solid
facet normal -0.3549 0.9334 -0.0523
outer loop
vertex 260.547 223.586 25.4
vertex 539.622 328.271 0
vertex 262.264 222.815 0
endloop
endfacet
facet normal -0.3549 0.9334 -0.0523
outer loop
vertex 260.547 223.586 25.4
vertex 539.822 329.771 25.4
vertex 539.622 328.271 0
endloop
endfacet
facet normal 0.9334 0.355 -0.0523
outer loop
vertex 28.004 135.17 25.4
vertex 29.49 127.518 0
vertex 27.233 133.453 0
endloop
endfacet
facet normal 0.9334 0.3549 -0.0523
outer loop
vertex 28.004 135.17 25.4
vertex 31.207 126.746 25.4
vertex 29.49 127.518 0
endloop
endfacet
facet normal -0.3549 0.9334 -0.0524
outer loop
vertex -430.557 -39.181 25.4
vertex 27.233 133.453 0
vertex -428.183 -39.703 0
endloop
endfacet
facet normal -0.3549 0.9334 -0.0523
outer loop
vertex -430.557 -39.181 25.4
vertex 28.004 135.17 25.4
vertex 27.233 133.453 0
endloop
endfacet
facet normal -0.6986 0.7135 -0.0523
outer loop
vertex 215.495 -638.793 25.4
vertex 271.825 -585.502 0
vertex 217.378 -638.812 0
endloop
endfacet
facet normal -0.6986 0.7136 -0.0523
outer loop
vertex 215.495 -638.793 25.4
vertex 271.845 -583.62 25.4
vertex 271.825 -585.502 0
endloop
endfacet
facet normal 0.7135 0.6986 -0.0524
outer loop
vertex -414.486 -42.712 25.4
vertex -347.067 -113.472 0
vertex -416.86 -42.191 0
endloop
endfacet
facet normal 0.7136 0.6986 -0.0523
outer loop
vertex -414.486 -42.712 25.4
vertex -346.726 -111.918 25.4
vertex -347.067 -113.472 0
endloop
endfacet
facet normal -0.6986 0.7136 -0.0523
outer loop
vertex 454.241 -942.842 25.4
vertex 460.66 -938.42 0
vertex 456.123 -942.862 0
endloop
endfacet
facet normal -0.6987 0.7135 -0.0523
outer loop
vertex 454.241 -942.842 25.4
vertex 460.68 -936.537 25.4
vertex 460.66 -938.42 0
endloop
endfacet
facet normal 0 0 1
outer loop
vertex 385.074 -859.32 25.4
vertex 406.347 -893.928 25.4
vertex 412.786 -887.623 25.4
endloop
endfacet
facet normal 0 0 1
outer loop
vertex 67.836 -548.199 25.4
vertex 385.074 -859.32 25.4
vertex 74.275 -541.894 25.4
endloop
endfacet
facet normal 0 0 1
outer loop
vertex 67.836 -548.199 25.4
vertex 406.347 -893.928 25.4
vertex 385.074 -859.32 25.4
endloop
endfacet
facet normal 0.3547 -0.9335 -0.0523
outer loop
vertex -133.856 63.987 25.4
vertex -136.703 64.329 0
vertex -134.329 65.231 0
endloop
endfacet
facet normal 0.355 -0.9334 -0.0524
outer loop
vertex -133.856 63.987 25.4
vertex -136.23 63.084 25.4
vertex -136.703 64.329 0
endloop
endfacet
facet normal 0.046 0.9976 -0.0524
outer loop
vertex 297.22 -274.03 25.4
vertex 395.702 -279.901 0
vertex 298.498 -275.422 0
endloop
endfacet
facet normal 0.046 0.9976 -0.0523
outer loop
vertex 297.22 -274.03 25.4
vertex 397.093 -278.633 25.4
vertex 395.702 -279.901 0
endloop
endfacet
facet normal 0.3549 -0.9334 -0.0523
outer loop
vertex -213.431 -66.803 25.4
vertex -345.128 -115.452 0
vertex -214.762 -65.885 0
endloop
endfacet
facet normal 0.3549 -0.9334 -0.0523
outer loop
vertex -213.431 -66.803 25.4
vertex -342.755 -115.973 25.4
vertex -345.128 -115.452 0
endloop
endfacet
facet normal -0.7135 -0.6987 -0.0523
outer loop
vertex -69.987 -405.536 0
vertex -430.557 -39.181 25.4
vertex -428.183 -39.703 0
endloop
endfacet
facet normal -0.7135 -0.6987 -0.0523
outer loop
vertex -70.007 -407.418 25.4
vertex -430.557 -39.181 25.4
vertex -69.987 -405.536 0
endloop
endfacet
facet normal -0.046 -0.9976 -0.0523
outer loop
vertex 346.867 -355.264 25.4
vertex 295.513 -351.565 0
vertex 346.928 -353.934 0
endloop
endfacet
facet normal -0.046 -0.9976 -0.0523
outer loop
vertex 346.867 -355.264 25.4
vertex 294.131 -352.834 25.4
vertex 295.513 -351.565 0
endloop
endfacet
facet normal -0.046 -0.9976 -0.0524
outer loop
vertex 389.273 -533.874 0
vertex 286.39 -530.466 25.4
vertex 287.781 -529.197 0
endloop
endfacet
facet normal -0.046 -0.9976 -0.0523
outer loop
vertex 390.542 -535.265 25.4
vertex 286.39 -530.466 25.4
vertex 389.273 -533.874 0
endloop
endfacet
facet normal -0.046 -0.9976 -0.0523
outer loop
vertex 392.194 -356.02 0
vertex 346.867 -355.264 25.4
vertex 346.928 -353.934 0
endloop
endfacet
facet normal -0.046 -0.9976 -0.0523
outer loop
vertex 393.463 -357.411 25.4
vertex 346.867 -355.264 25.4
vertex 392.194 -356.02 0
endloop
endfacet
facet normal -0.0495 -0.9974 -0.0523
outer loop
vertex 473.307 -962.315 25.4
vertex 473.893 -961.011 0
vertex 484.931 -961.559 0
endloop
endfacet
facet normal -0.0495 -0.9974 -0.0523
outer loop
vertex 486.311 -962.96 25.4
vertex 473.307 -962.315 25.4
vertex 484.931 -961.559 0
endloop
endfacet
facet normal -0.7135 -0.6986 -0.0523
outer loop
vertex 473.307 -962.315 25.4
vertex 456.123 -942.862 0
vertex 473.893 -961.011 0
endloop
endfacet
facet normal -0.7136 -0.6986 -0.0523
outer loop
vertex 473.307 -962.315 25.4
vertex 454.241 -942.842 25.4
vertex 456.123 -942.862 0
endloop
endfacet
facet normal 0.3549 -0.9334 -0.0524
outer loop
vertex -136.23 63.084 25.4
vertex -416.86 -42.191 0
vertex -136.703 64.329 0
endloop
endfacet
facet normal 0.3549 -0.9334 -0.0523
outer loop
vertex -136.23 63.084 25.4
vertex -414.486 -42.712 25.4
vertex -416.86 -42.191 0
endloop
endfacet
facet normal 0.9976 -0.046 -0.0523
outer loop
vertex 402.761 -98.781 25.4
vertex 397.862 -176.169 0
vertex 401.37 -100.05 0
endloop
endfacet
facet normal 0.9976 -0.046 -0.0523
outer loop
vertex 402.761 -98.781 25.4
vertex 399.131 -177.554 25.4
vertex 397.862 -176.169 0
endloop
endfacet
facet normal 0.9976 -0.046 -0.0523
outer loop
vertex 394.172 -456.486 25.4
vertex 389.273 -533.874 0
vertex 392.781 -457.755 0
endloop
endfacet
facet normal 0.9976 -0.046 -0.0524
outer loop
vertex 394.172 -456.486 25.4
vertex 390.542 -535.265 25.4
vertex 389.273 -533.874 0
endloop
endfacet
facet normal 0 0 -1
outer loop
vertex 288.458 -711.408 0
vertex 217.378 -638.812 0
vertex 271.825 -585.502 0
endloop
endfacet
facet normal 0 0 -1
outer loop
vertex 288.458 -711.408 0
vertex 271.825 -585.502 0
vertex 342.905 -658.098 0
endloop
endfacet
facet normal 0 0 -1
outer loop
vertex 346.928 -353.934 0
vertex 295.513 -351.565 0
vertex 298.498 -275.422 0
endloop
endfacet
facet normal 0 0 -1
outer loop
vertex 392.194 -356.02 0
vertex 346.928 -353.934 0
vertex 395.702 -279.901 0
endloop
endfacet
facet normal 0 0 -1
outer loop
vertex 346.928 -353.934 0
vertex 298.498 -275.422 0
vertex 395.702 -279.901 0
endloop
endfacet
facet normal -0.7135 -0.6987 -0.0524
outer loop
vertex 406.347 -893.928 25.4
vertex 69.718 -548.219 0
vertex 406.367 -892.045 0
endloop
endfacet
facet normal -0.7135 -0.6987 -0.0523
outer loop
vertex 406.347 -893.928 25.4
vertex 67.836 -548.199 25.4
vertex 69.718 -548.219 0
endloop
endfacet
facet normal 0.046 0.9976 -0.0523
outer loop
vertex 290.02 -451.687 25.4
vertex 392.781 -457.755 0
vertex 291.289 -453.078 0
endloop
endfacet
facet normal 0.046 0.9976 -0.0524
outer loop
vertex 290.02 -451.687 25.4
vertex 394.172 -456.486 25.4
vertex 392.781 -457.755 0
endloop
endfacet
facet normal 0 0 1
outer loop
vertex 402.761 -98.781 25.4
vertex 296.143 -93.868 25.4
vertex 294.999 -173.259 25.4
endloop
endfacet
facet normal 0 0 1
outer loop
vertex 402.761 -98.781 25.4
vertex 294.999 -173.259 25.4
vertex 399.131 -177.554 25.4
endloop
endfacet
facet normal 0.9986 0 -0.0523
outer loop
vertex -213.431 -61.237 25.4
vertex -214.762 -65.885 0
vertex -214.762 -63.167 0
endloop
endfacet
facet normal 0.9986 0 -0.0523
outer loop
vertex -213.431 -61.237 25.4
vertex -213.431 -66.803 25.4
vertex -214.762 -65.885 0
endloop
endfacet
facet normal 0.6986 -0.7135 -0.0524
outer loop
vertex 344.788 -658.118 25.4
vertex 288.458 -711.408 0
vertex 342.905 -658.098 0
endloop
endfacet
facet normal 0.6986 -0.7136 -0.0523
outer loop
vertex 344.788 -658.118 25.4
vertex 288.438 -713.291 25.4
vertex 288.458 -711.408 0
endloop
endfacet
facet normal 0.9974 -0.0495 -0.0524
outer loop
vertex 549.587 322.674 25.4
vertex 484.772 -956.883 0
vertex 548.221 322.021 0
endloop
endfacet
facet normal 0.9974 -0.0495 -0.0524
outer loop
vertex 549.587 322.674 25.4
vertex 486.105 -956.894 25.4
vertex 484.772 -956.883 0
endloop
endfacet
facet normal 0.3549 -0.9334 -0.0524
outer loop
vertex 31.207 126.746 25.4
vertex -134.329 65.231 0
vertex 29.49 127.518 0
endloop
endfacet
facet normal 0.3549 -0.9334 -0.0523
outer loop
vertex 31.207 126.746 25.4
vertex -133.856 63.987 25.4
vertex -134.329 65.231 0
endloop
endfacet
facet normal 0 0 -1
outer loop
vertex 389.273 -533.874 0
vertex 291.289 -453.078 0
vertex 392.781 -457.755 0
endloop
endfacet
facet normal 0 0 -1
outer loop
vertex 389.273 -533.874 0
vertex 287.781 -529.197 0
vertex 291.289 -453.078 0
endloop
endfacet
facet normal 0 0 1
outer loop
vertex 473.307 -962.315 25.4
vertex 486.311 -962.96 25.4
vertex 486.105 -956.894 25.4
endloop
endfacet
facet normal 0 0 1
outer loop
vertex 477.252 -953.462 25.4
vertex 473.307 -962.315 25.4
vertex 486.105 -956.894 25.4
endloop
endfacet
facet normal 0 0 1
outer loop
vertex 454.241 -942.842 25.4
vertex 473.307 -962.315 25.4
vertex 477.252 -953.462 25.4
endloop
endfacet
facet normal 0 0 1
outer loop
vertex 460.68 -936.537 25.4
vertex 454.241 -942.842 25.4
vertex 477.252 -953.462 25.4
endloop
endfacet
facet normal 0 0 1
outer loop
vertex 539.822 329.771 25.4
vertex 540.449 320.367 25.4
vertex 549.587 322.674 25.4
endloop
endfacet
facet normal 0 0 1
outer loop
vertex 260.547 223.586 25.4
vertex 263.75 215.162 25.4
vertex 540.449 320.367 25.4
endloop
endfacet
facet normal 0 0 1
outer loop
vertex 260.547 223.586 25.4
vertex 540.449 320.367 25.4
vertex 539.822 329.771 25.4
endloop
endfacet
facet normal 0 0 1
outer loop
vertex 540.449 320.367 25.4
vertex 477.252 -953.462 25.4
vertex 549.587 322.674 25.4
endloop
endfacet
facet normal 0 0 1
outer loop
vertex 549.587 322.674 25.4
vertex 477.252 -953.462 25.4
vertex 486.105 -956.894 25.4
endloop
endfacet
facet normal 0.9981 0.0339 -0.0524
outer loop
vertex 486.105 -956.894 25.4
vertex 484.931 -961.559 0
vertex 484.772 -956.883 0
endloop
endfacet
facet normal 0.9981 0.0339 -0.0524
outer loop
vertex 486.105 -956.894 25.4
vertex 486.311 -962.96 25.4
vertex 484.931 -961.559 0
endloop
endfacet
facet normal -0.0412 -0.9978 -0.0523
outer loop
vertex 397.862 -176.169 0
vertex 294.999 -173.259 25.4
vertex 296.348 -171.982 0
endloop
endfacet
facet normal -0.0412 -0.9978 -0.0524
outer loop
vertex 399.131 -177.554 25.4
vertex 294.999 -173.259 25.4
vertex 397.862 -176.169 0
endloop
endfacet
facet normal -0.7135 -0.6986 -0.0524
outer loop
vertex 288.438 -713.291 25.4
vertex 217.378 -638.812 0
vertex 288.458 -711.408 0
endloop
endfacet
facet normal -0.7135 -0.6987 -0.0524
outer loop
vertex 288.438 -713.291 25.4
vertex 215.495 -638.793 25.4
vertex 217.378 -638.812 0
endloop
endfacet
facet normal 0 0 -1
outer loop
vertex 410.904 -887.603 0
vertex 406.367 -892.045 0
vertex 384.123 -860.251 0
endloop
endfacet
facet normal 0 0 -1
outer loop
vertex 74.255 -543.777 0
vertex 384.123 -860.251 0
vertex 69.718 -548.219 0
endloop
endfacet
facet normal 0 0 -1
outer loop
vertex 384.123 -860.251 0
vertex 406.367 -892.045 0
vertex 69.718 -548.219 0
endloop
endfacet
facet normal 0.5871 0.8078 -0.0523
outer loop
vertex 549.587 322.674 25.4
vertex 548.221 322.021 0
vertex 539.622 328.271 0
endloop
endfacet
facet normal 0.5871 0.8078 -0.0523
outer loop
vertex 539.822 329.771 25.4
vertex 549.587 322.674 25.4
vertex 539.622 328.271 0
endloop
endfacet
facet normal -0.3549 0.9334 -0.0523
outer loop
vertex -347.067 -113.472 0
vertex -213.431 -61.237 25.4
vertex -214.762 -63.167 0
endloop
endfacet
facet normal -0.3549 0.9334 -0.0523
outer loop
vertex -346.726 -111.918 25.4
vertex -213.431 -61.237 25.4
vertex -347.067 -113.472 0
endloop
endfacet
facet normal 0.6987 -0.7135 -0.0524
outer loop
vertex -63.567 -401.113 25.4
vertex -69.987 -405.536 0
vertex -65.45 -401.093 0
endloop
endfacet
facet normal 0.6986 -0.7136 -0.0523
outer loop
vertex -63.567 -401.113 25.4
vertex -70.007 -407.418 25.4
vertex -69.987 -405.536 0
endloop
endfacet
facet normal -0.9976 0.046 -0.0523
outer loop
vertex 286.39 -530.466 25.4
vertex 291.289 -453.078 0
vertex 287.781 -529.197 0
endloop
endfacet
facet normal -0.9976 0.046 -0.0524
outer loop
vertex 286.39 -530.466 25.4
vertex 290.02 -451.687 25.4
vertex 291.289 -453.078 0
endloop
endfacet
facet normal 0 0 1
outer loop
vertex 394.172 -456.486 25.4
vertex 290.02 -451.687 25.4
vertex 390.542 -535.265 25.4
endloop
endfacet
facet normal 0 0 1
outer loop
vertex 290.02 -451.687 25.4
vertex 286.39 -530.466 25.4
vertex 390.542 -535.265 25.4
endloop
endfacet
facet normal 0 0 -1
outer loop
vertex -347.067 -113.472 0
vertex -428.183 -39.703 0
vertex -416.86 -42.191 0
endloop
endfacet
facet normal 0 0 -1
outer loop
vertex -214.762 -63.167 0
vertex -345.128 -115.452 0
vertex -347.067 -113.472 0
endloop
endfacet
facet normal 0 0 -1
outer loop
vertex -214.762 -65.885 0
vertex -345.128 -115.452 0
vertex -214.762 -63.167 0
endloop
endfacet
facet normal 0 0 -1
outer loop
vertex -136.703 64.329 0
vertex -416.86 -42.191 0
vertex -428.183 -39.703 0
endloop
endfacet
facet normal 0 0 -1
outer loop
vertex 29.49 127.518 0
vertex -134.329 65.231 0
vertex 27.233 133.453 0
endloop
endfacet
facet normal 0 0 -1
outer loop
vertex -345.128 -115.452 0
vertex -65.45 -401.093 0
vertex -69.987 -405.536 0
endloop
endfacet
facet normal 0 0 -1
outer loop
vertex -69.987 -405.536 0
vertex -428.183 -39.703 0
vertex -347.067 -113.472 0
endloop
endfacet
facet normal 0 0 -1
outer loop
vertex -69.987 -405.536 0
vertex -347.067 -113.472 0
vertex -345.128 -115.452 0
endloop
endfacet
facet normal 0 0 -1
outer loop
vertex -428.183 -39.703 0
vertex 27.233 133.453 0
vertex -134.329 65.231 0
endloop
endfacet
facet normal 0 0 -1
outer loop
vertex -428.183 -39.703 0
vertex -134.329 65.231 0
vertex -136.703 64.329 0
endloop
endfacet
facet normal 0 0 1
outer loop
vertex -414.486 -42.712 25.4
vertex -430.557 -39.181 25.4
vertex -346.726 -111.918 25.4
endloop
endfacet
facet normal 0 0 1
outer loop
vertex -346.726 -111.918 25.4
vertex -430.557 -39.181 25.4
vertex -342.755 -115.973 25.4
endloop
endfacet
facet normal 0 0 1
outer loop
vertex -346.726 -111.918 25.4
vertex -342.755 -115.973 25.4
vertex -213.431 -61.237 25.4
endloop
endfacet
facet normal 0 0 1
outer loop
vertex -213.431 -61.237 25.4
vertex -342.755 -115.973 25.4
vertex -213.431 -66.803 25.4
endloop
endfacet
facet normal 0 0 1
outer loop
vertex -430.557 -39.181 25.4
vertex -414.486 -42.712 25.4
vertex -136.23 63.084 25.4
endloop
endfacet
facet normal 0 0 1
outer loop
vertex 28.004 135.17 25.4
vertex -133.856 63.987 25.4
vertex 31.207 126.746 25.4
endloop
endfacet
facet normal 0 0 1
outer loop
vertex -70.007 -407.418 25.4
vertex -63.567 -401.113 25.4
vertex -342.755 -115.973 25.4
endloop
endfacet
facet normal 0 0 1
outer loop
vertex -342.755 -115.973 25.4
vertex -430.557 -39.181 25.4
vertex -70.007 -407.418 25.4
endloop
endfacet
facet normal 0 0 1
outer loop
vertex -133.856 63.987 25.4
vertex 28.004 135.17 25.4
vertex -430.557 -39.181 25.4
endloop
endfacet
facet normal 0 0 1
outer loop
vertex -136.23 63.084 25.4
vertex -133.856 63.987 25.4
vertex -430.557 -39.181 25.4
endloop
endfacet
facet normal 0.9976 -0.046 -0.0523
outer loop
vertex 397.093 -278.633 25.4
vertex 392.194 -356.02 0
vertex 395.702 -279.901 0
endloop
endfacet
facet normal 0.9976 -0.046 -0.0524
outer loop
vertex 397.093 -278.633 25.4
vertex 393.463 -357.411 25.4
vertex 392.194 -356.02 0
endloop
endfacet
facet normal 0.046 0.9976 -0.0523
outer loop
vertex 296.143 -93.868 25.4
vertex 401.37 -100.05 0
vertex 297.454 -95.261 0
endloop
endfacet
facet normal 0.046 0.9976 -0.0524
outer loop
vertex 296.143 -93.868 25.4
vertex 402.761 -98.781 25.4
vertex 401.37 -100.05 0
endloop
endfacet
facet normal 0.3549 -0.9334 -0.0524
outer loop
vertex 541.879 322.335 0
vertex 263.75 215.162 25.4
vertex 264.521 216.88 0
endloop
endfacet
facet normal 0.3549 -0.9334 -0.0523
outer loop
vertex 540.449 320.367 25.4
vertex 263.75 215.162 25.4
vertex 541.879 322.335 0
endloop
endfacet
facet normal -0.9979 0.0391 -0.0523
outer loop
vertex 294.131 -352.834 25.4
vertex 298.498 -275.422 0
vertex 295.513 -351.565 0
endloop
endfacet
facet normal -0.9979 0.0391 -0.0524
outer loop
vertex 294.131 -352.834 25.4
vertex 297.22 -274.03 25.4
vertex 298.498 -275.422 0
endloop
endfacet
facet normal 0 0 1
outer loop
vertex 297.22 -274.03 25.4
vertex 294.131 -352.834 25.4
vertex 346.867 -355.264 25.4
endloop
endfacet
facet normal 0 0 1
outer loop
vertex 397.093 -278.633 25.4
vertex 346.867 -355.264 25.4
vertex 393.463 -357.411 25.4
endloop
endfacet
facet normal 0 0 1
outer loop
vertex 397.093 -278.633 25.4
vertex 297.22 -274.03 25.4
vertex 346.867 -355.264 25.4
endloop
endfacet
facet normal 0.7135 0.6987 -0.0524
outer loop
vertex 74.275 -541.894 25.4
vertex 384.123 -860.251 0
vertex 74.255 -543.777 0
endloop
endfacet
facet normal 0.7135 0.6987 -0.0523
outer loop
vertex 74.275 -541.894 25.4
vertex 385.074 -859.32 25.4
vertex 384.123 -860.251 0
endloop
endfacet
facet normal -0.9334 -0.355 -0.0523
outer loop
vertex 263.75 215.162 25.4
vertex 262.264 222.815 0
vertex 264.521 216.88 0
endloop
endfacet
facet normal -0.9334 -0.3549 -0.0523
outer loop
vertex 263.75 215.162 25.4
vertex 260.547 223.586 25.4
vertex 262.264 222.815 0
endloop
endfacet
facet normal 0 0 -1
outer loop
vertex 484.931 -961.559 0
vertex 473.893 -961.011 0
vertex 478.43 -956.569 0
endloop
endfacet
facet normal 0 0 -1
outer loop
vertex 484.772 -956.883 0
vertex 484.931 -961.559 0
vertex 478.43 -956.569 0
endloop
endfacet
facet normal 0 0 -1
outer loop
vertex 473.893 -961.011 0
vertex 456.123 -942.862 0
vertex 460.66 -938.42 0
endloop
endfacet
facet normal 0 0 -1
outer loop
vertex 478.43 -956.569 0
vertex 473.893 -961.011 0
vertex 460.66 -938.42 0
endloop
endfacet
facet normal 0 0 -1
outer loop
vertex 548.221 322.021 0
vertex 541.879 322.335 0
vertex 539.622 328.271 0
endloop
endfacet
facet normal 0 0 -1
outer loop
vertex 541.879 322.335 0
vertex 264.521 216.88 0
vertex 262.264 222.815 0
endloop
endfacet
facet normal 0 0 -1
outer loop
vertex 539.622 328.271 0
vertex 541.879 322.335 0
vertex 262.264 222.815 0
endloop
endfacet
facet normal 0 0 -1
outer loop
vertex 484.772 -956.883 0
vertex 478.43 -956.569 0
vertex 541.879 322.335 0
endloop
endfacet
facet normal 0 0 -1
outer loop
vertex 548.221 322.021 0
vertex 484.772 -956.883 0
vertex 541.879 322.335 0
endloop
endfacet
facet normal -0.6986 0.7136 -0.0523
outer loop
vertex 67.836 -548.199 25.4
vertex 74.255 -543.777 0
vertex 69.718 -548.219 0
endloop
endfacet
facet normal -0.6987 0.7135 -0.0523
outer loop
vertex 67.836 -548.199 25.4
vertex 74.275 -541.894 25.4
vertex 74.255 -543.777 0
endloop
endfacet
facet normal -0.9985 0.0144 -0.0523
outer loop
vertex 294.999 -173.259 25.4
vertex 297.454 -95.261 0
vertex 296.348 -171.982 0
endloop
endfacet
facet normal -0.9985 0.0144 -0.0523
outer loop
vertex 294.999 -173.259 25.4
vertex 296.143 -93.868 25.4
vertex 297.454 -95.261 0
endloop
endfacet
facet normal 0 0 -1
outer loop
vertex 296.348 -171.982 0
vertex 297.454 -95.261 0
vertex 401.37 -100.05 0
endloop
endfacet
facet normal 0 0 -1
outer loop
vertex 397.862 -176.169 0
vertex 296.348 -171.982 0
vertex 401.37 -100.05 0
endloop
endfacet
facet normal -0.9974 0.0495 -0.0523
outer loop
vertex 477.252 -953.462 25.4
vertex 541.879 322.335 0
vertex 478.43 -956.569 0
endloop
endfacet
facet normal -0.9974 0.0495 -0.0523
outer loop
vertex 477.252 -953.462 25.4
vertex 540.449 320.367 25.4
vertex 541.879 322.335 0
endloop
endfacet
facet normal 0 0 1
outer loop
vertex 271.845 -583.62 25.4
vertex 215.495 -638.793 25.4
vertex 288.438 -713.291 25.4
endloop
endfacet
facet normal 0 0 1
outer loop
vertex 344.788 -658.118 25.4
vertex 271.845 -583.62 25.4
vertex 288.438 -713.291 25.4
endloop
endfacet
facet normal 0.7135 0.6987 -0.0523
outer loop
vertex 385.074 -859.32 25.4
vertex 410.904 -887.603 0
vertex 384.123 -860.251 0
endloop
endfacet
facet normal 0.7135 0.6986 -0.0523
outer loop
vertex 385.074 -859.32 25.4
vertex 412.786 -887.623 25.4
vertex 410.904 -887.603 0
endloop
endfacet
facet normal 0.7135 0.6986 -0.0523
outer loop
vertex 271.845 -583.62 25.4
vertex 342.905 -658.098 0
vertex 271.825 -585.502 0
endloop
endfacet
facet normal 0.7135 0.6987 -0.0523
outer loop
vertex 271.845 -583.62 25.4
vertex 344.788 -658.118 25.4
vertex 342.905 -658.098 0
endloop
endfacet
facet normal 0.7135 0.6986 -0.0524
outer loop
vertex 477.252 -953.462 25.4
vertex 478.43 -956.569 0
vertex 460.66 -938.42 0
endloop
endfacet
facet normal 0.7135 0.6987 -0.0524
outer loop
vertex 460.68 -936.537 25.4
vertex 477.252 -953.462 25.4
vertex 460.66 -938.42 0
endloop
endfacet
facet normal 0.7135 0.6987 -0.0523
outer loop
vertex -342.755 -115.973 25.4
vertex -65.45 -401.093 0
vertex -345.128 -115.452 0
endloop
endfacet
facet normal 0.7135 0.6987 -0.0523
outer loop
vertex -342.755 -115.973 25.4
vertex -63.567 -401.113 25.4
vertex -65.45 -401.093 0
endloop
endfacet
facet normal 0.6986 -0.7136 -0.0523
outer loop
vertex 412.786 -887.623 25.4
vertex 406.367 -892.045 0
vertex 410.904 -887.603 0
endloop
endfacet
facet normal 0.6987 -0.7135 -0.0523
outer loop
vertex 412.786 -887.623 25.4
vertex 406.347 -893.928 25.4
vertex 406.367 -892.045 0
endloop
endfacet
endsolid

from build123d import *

# Parameters (mm, degrees)
F1_DEPTH = 25.4
F1_TAPER = -3


with BuildPart() as f1:
    # F0 (on Top) → F1 (new body)
    with BuildSketch(Plane.XY):
        Polygon((-347.0672607158, -113.4715431192), (-416.8599761126, -42.1908441073), (-136.7031317252, 64.3287522537), (-134.3289502972, 65.2314496265), (29.489568236, 127.5175683496), (27.232824804, 133.4530219197), (-138.9598751572, 70.2642058237), (-428.1832746342, -39.702623071), (-69.9868951879, -405.5357643277), (-65.449659507, -401.0932433794), (-214.7623137451, -248.5972371001), (-345.1283856185, -115.4517551147), align=None)
        Polygon((-214.7623137451, -63.1673302105), (-347.0672607158, -113.4715431192), (-345.1283856185, -115.4517551147), (-214.7623137451, -65.8847299525), align=None)
    extrude(amount=F1_DEPTH, taper=F1_TAPER)


with BuildPart() as f1b:
    # F0 (on Top) → F1, piece 2 (new body)
    with BuildSketch(Plane.XY):
        Polygon((473.8930384086, -961.0112408853), (478.4302740895, -956.5687199371), (460.6601902965, -938.4197772134), (456.1229546155, -942.8622981616), align=None)
        Polygon((496.9257680351, -583.7652153246), (478.4302740895, -956.5687199371), (473.8930384086, -961.0112408853), (484.9311565472, -961.5588630098), (484.7724737264, -956.8833685751), (548.22134676, 322.0206877443), (539.6224036911, 328.2707899524), (436.354984621, 289.0070560228), (262.2640253228, 222.8152099692), (264.5207687548, 216.8797563991), (351.5662484039, 249.9756794259), (438.611728053, 283.0716024527), (541.8791471231, 322.3353363823), (530.2984636922, 88.9098662905), (524.0748561487, -36.5359698884), align=None)
    extrude(amount=F1_DEPTH, taper=F1_TAPER)


with BuildPart() as f1c:
    # F0 (on Top) → F1, piece 3 (new body)
    with BuildSketch(Plane.XY):
        Polygon((217.3779084847, -638.8124593455), (288.4582436569, -711.4082302403), (342.905071828, -658.0979788612), (271.8247366558, -585.5022079664), align=None)
    extrude(amount=F1_DEPTH, taper=F1_TAPER)


with BuildPart() as f1d:
    # F0 (on Top) → F1, piece 4 (new body)
    with BuildSketch(Plane.XY):
        Polygon((291.2886974357, -453.0779337607), (287.7810001373, -529.1971564293), (389.2732970287, -533.8740861604), (392.7809943271, -457.7548634919), align=None)
    extrude(amount=F1_DEPTH, taper=F1_TAPER)


with BuildPart() as f1e:
    # F0 (on Top) → F1, piece 5 (new body)
    with BuildSketch(Plane.XY):
        Polygon((295.5127456932, -351.5649988721), (346.9283164057, -353.934311802), (392.1942050738, -356.0202374042), (395.7019023722, -279.9010147357), (298.4978964264, -275.4216964099), align=None)
    extrude(amount=F1_DEPTH, taper=F1_TAPER)


with BuildPart() as f1f:
    # F0 (on Top) → F1, piece 6 (new body)
    with BuildSketch(Plane.XY):
        Polygon((297.4541779926, -95.2612408435), (296.3482824517, -171.9824470033), (397.8619873524, -176.1690586814), (401.3696846507, -100.0498360128), align=None)
    extrude(amount=F1_DEPTH, taper=F1_TAPER)


with BuildPart() as f1g:
    # F0 (on Top) → F1, piece 7 (new body)
    with BuildSketch(Plane.XY):
        Polygon((410.9039556759, -887.602737587), (384.1233039537, -860.2511212485), (74.2552466151, -543.7766639507), (69.7180109341, -548.2191848989), (406.366719995, -892.0452585353), align=None)
    extrude(amount=F1_DEPTH, taper=F1_TAPER)


solid = Compound([f1.part, f1b.part, f1c.part, f1d.part, f1e.part, f1f.part, f1g.part])
